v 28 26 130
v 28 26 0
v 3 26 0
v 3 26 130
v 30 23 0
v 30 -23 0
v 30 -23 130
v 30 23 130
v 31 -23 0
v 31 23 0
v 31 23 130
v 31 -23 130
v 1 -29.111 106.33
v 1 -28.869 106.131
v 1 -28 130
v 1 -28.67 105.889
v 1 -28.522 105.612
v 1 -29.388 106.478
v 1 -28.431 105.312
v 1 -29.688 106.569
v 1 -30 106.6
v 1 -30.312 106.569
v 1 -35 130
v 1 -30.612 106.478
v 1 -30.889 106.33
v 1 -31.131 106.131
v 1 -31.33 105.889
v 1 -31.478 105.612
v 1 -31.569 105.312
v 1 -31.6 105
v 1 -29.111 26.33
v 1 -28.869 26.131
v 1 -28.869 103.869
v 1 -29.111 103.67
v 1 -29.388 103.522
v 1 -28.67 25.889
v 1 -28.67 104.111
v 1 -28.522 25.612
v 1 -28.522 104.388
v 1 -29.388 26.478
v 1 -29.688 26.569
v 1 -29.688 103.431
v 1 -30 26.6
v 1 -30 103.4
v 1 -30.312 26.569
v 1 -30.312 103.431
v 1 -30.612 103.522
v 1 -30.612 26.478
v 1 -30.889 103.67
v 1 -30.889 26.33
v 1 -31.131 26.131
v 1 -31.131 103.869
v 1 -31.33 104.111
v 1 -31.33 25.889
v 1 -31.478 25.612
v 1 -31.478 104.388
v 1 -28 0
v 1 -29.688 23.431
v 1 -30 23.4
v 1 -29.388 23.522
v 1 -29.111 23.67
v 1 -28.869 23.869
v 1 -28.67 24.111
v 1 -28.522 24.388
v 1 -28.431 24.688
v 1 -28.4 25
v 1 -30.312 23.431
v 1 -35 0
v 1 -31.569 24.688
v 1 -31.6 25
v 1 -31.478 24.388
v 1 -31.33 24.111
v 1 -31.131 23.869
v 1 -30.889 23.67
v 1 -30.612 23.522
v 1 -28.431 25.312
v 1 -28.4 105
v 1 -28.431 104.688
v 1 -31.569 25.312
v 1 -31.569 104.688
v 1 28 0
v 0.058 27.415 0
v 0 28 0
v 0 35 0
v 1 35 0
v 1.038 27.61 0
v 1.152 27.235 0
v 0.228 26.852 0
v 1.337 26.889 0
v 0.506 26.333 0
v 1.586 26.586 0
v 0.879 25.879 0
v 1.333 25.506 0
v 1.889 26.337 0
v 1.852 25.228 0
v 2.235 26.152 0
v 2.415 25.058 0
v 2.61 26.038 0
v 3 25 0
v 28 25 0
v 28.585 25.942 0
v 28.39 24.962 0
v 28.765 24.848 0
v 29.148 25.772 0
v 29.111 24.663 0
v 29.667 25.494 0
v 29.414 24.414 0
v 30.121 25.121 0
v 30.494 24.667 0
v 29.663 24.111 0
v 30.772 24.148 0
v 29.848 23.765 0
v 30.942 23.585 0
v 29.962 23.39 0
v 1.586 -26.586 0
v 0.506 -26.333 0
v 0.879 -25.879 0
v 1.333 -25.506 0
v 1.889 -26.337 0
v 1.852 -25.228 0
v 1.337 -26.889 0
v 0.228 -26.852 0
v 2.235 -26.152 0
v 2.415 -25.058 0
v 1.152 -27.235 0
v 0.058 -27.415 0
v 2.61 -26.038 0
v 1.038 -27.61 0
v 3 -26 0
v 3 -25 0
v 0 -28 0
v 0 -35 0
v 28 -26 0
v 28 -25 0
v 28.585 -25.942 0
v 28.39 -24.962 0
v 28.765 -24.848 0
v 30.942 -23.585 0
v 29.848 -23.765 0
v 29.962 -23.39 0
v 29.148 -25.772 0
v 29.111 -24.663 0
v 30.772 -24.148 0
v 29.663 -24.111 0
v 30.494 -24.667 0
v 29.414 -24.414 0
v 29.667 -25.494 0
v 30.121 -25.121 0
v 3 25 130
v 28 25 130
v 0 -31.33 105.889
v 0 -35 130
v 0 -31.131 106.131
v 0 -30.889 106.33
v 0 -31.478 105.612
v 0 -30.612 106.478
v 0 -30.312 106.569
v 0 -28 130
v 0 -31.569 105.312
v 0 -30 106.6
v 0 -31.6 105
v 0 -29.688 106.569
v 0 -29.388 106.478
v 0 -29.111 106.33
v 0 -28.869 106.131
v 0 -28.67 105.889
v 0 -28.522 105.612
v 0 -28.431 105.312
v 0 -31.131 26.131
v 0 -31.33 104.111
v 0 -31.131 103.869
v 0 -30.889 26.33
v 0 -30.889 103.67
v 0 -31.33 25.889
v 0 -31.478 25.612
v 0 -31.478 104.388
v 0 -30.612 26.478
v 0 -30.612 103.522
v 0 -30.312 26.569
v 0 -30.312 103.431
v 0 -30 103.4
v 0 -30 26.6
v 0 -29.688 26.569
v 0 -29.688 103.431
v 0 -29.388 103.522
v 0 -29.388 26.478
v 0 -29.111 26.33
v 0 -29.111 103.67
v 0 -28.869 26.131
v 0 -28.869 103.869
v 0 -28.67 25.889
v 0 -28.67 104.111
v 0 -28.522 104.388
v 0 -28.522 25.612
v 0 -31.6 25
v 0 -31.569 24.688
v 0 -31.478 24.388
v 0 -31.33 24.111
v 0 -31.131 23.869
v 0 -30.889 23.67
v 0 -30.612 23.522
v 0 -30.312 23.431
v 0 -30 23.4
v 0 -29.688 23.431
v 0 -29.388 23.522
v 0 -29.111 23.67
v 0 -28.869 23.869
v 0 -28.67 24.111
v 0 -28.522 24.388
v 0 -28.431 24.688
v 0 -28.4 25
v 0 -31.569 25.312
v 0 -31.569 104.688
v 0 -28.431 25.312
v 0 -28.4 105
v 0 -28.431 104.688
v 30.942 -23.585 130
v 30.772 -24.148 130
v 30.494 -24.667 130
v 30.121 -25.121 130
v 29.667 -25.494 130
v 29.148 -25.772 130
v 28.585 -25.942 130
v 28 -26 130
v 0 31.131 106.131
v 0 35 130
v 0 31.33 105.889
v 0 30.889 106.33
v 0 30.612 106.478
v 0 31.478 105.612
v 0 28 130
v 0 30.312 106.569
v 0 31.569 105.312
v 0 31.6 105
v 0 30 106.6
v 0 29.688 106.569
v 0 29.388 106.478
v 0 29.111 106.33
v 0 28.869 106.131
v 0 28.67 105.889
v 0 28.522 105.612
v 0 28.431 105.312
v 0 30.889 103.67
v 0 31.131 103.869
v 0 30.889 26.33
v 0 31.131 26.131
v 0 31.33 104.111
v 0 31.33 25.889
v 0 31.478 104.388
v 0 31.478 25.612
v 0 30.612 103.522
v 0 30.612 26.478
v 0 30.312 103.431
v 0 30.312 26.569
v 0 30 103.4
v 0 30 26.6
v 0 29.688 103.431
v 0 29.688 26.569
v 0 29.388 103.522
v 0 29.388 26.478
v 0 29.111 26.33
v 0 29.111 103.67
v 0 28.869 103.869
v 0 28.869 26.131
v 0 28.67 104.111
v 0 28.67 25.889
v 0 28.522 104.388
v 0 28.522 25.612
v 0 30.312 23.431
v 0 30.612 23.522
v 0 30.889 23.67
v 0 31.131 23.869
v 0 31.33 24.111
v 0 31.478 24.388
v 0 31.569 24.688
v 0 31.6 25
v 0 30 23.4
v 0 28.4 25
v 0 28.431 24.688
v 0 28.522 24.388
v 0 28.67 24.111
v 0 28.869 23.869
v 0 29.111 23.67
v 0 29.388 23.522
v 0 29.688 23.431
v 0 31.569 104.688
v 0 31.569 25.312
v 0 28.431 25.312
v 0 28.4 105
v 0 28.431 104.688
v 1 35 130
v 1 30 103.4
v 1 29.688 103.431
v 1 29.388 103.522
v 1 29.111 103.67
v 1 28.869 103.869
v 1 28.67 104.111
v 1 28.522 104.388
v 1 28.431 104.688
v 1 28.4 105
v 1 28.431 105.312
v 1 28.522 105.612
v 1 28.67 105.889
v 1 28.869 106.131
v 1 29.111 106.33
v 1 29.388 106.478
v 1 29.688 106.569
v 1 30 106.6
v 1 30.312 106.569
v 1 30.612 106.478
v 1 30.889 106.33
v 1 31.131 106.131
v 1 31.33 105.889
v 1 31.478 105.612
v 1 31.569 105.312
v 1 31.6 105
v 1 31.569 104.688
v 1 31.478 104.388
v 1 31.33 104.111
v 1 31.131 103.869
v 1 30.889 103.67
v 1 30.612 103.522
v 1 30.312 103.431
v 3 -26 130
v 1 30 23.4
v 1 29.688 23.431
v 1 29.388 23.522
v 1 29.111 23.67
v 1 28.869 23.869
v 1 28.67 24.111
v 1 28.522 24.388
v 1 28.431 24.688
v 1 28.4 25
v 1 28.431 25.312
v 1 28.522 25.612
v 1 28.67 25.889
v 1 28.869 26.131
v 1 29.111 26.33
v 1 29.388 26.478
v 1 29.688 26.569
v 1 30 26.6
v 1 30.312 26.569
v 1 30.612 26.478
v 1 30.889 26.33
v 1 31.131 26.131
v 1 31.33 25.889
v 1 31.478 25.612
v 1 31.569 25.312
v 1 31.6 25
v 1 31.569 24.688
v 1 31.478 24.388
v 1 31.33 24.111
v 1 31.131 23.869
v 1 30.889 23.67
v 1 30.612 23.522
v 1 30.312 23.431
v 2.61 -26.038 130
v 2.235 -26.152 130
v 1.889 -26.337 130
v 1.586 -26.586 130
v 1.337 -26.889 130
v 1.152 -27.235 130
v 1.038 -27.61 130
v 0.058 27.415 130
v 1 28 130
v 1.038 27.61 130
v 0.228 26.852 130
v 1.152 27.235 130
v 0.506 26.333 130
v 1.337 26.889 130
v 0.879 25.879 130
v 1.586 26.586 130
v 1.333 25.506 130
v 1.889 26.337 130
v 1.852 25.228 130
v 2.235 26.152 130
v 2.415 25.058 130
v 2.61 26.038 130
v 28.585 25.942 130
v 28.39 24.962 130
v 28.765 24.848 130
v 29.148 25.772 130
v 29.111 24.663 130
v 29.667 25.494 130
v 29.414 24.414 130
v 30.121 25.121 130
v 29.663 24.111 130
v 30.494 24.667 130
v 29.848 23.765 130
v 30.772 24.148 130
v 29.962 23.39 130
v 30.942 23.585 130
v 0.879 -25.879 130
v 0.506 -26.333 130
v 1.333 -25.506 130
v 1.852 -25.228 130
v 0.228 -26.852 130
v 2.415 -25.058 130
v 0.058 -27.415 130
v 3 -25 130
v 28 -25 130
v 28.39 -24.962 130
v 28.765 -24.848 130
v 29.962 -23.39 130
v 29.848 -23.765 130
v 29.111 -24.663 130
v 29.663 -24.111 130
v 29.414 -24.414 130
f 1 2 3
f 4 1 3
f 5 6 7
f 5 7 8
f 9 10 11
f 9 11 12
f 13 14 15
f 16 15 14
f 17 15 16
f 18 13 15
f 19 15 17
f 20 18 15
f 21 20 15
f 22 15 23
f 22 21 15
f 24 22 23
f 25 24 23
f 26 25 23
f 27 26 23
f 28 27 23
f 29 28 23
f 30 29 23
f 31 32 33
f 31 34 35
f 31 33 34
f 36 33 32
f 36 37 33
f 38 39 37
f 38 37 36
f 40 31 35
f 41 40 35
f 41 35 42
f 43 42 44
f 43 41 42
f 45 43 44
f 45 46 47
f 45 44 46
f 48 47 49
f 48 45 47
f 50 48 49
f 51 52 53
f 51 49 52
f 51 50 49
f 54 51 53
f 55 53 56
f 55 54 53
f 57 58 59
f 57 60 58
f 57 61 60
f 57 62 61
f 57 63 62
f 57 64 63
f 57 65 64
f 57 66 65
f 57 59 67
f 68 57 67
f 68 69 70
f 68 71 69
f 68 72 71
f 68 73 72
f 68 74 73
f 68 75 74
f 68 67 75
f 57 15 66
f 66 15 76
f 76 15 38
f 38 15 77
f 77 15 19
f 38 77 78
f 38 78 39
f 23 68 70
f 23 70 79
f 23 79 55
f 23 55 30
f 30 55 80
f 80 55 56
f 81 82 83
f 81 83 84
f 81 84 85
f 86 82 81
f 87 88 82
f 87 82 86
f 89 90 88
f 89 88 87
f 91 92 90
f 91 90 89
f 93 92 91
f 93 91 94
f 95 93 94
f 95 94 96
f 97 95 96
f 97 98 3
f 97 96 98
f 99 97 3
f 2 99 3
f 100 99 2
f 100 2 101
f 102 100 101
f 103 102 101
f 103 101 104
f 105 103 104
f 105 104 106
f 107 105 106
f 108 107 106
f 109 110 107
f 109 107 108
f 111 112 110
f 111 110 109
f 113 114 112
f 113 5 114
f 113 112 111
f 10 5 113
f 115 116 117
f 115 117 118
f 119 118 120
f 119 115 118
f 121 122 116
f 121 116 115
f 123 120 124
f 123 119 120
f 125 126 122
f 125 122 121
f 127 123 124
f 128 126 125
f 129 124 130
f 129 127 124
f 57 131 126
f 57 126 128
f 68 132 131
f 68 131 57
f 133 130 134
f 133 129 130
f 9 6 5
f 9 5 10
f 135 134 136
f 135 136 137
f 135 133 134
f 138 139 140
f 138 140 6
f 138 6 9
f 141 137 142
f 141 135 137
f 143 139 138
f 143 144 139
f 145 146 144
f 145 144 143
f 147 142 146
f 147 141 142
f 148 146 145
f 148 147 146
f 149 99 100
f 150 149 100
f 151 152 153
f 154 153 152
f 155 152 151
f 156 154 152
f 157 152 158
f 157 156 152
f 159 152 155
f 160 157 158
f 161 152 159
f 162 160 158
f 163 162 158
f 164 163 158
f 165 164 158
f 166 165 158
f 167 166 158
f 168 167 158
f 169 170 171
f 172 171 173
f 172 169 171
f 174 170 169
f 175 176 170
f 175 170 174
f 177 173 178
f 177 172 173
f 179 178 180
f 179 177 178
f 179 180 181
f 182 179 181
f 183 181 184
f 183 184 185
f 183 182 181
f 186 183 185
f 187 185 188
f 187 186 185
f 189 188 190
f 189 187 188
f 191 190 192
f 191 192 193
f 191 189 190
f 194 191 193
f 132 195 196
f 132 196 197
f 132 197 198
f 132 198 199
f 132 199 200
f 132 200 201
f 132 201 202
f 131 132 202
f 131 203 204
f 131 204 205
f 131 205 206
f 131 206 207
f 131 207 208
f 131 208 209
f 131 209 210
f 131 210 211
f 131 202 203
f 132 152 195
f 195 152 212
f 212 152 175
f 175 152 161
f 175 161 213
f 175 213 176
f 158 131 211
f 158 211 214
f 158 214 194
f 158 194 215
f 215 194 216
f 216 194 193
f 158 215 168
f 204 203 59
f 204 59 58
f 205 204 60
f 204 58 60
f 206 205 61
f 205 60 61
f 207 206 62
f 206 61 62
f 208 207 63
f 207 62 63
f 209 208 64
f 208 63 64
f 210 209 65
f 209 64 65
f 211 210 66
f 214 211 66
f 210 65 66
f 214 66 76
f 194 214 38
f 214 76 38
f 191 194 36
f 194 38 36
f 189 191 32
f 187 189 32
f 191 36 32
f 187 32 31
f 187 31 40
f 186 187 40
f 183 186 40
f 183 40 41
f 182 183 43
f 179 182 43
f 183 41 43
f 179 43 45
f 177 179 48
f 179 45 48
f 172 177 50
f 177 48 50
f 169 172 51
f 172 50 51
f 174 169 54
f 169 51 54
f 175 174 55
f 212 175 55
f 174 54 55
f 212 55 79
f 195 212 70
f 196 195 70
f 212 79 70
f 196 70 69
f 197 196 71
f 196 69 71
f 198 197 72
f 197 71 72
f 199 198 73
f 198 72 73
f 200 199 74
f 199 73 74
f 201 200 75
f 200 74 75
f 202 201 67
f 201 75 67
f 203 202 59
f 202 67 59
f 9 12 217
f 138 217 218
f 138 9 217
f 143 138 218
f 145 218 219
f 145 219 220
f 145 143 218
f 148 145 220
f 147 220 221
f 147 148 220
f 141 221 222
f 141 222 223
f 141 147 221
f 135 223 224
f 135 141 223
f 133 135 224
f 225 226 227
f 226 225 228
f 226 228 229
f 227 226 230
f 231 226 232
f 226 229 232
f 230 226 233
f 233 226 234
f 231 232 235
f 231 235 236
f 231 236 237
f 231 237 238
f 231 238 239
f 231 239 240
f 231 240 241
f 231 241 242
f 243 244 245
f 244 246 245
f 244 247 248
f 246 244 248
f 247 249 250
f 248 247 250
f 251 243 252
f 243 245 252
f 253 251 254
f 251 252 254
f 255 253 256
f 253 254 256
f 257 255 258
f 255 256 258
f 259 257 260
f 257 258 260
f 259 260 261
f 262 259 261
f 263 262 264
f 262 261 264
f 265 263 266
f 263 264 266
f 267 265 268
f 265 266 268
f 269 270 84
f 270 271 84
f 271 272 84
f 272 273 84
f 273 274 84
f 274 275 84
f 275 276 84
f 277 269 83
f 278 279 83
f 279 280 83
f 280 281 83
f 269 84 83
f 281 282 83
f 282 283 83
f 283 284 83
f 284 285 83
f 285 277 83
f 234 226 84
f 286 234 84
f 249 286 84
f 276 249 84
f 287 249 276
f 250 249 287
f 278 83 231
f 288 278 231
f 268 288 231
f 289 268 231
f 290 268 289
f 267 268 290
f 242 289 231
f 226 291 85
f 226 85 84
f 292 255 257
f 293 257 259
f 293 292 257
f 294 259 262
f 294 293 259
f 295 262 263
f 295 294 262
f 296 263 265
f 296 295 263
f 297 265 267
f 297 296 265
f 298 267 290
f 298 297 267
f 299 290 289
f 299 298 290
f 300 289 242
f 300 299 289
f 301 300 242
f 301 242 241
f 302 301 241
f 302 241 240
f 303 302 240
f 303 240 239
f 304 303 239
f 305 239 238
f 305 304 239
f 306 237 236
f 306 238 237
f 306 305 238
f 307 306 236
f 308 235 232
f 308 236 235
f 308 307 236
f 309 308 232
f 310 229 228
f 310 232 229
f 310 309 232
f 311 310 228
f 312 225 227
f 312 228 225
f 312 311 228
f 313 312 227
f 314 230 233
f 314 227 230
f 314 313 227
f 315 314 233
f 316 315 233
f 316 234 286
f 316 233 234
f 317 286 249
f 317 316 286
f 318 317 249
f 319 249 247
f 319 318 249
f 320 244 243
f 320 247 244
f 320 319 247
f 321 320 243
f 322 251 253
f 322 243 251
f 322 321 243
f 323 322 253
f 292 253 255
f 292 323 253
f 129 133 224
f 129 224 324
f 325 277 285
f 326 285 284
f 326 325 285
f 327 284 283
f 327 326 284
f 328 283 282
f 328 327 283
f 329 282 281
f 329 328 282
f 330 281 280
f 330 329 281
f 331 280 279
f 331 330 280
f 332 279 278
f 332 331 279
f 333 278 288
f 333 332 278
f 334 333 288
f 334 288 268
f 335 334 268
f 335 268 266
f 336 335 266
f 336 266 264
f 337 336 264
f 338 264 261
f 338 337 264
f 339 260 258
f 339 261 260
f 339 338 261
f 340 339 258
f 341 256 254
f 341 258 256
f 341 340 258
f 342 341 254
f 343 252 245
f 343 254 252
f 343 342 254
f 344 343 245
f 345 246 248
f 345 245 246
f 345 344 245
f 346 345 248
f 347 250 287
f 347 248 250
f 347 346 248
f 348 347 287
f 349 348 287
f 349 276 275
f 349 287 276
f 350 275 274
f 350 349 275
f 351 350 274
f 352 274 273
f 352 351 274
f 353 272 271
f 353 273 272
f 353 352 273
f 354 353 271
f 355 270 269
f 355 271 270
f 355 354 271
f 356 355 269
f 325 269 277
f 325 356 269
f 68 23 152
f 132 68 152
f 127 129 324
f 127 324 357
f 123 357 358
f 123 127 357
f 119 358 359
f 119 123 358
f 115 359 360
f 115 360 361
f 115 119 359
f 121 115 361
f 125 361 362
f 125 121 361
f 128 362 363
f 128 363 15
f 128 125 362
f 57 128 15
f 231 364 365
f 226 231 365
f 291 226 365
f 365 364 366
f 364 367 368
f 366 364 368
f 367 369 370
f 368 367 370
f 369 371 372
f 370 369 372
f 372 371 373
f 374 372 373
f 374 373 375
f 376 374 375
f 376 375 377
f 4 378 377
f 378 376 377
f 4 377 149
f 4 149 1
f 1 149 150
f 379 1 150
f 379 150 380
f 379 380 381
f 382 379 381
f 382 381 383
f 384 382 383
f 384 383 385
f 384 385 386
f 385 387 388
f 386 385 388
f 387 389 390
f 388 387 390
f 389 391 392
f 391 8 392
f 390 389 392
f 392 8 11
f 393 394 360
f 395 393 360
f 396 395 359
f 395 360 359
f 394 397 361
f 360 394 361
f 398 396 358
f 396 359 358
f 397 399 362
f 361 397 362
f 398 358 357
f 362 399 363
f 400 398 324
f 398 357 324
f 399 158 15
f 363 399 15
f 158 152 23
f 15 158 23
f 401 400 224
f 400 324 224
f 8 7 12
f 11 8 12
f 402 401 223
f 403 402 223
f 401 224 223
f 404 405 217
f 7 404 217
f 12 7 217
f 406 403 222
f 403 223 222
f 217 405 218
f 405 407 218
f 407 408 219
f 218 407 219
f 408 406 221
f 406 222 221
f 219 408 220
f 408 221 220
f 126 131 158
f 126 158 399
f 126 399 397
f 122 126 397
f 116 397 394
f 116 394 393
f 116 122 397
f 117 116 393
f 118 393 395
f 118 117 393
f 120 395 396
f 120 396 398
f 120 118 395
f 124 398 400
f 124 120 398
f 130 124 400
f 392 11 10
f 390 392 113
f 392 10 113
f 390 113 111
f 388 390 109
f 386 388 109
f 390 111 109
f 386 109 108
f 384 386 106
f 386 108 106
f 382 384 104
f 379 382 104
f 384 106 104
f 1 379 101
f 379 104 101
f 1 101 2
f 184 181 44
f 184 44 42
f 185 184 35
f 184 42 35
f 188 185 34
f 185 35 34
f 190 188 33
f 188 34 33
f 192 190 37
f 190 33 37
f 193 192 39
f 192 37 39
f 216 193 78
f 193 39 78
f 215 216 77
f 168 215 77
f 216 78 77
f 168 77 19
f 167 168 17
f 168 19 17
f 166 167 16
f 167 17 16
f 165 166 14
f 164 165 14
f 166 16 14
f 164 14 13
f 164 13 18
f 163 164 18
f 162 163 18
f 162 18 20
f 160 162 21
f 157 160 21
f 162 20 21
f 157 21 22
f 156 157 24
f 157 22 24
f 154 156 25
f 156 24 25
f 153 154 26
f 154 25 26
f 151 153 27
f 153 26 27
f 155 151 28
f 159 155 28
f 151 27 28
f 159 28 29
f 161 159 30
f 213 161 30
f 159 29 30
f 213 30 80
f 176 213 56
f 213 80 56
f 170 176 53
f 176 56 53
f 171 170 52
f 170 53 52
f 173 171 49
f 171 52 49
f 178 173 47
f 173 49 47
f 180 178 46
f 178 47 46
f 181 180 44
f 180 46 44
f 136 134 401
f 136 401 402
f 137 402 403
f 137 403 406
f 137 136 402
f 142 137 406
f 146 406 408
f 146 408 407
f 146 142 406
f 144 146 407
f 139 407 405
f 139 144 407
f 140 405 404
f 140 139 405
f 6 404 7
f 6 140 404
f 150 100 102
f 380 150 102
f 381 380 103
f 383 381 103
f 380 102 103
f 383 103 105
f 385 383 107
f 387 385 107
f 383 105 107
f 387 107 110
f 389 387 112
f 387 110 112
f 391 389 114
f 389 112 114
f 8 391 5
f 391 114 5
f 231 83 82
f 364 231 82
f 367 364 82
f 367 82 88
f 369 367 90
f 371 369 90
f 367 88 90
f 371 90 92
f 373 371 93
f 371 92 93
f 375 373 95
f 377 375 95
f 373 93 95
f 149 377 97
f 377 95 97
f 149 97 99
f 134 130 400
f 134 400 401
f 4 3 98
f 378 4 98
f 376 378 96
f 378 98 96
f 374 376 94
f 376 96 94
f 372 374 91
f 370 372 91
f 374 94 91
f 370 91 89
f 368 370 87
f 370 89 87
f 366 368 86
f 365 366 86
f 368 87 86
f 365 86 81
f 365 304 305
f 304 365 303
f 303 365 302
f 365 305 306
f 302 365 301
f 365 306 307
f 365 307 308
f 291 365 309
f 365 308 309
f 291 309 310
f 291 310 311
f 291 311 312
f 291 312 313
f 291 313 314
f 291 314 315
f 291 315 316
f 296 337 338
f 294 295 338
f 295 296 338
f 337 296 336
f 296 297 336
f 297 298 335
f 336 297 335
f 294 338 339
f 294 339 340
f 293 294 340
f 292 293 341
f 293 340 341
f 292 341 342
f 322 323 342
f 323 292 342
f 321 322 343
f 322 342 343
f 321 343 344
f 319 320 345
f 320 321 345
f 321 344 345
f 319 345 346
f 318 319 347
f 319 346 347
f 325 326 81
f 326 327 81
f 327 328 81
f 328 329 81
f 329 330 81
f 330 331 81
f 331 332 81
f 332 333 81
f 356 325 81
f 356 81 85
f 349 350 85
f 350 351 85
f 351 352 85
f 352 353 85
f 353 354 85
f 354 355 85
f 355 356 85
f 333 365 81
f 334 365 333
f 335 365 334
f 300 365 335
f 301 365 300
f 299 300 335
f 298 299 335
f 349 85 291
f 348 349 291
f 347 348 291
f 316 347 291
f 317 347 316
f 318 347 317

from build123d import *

# Parameters (mm, degrees)
EXTRUDE_1_DEPTH             = 130
HOLE_WIZARD_M3_2_AT_2_COUNT = 2
HOLE_WIZARD_M3_2_AT_2_PITCH = 80


with BuildPart() as part:
    # ｽｹｯﾁ1 → ﾎﾞｽ - 押し出し1 (new body)
    with BuildSketch(Plane.XY):
        with BuildLine():
            Line((0, 35), (0, 28))
            ThreePointArc((0, 28), (0.878679656, 25.878679656), (3, 25))
            Line((3, 25), (28, 25))
            ThreePointArc((28, 25), (29.414213562, 24.414213562), (30, 23))
            Line((30, 23), (30, 0))
            Line((30, 0), (31, 0))
            Line((31, 0), (31, 23))
            ThreePointArc((31, 23), (30.121320344, 25.121320344), (28, 26))
            Line((28, 26), (3, 26))
            ThreePointArc((3, 26), (1.585786438, 26.585786438), (1, 28))
            Line((1, 28), (1, 35))
            Line((1, 35), (0, 35))
        make_face()
    extrude_1 = extrude(amount=EXTRUDE_1_DEPTH)

    # ｽｹｯﾁ5 → M3 すきま穴2 (revolve, cut)
    with BuildSketch(Plane(origin=(1, 30, 25), x_dir=(0, 0, -1), z_dir=(0, 1, 0))):
        Polygon((0, 0), (0, 10.96137699), (1.6, 10), (1.6, 0), align=None)
    hole_wizard_m3_2 = revolve(axis=Axis((7.35, 30, 25), (-1, 0, 0)), mode=Mode.SUBTRACT)

    # M3 すきま穴2 at 2: M3 すきま穴2 ×2
    with Locations(*[(0, 0, i * HOLE_WIZARD_M3_2_AT_2_PITCH) for i in range(1, HOLE_WIZARD_M3_2_AT_2_COUNT)]):
        add(hole_wizard_m3_2, mode=Mode.SUBTRACT)

    # ﾐﾗｰ2: ﾎﾞｽ - 押し出し1, M3 すきま穴2 across plane
    add(extrude_1.mirror(Plane.ZX))
    add(hole_wizard_m3_2.mirror(Plane.ZX), mode=Mode.SUBTRACT)

    # ﾐﾗｰ2 copy 1 sketch → ﾐﾗｰ2 copy 1 (revolve, cut)
    with BuildSketch(Plane(origin=(1, -30, 105), x_dir=(0, 0, -1), z_dir=(0, -1, 0))):
        Polygon((0, 0), (0, -10.96137699), (1.6, -10), (1.6, 0), align=None)
    revolve(axis=Axis((7.35, -30, 105), (1, 0, 0)), mode=Mode.SUBTRACT)


solid = part.part
